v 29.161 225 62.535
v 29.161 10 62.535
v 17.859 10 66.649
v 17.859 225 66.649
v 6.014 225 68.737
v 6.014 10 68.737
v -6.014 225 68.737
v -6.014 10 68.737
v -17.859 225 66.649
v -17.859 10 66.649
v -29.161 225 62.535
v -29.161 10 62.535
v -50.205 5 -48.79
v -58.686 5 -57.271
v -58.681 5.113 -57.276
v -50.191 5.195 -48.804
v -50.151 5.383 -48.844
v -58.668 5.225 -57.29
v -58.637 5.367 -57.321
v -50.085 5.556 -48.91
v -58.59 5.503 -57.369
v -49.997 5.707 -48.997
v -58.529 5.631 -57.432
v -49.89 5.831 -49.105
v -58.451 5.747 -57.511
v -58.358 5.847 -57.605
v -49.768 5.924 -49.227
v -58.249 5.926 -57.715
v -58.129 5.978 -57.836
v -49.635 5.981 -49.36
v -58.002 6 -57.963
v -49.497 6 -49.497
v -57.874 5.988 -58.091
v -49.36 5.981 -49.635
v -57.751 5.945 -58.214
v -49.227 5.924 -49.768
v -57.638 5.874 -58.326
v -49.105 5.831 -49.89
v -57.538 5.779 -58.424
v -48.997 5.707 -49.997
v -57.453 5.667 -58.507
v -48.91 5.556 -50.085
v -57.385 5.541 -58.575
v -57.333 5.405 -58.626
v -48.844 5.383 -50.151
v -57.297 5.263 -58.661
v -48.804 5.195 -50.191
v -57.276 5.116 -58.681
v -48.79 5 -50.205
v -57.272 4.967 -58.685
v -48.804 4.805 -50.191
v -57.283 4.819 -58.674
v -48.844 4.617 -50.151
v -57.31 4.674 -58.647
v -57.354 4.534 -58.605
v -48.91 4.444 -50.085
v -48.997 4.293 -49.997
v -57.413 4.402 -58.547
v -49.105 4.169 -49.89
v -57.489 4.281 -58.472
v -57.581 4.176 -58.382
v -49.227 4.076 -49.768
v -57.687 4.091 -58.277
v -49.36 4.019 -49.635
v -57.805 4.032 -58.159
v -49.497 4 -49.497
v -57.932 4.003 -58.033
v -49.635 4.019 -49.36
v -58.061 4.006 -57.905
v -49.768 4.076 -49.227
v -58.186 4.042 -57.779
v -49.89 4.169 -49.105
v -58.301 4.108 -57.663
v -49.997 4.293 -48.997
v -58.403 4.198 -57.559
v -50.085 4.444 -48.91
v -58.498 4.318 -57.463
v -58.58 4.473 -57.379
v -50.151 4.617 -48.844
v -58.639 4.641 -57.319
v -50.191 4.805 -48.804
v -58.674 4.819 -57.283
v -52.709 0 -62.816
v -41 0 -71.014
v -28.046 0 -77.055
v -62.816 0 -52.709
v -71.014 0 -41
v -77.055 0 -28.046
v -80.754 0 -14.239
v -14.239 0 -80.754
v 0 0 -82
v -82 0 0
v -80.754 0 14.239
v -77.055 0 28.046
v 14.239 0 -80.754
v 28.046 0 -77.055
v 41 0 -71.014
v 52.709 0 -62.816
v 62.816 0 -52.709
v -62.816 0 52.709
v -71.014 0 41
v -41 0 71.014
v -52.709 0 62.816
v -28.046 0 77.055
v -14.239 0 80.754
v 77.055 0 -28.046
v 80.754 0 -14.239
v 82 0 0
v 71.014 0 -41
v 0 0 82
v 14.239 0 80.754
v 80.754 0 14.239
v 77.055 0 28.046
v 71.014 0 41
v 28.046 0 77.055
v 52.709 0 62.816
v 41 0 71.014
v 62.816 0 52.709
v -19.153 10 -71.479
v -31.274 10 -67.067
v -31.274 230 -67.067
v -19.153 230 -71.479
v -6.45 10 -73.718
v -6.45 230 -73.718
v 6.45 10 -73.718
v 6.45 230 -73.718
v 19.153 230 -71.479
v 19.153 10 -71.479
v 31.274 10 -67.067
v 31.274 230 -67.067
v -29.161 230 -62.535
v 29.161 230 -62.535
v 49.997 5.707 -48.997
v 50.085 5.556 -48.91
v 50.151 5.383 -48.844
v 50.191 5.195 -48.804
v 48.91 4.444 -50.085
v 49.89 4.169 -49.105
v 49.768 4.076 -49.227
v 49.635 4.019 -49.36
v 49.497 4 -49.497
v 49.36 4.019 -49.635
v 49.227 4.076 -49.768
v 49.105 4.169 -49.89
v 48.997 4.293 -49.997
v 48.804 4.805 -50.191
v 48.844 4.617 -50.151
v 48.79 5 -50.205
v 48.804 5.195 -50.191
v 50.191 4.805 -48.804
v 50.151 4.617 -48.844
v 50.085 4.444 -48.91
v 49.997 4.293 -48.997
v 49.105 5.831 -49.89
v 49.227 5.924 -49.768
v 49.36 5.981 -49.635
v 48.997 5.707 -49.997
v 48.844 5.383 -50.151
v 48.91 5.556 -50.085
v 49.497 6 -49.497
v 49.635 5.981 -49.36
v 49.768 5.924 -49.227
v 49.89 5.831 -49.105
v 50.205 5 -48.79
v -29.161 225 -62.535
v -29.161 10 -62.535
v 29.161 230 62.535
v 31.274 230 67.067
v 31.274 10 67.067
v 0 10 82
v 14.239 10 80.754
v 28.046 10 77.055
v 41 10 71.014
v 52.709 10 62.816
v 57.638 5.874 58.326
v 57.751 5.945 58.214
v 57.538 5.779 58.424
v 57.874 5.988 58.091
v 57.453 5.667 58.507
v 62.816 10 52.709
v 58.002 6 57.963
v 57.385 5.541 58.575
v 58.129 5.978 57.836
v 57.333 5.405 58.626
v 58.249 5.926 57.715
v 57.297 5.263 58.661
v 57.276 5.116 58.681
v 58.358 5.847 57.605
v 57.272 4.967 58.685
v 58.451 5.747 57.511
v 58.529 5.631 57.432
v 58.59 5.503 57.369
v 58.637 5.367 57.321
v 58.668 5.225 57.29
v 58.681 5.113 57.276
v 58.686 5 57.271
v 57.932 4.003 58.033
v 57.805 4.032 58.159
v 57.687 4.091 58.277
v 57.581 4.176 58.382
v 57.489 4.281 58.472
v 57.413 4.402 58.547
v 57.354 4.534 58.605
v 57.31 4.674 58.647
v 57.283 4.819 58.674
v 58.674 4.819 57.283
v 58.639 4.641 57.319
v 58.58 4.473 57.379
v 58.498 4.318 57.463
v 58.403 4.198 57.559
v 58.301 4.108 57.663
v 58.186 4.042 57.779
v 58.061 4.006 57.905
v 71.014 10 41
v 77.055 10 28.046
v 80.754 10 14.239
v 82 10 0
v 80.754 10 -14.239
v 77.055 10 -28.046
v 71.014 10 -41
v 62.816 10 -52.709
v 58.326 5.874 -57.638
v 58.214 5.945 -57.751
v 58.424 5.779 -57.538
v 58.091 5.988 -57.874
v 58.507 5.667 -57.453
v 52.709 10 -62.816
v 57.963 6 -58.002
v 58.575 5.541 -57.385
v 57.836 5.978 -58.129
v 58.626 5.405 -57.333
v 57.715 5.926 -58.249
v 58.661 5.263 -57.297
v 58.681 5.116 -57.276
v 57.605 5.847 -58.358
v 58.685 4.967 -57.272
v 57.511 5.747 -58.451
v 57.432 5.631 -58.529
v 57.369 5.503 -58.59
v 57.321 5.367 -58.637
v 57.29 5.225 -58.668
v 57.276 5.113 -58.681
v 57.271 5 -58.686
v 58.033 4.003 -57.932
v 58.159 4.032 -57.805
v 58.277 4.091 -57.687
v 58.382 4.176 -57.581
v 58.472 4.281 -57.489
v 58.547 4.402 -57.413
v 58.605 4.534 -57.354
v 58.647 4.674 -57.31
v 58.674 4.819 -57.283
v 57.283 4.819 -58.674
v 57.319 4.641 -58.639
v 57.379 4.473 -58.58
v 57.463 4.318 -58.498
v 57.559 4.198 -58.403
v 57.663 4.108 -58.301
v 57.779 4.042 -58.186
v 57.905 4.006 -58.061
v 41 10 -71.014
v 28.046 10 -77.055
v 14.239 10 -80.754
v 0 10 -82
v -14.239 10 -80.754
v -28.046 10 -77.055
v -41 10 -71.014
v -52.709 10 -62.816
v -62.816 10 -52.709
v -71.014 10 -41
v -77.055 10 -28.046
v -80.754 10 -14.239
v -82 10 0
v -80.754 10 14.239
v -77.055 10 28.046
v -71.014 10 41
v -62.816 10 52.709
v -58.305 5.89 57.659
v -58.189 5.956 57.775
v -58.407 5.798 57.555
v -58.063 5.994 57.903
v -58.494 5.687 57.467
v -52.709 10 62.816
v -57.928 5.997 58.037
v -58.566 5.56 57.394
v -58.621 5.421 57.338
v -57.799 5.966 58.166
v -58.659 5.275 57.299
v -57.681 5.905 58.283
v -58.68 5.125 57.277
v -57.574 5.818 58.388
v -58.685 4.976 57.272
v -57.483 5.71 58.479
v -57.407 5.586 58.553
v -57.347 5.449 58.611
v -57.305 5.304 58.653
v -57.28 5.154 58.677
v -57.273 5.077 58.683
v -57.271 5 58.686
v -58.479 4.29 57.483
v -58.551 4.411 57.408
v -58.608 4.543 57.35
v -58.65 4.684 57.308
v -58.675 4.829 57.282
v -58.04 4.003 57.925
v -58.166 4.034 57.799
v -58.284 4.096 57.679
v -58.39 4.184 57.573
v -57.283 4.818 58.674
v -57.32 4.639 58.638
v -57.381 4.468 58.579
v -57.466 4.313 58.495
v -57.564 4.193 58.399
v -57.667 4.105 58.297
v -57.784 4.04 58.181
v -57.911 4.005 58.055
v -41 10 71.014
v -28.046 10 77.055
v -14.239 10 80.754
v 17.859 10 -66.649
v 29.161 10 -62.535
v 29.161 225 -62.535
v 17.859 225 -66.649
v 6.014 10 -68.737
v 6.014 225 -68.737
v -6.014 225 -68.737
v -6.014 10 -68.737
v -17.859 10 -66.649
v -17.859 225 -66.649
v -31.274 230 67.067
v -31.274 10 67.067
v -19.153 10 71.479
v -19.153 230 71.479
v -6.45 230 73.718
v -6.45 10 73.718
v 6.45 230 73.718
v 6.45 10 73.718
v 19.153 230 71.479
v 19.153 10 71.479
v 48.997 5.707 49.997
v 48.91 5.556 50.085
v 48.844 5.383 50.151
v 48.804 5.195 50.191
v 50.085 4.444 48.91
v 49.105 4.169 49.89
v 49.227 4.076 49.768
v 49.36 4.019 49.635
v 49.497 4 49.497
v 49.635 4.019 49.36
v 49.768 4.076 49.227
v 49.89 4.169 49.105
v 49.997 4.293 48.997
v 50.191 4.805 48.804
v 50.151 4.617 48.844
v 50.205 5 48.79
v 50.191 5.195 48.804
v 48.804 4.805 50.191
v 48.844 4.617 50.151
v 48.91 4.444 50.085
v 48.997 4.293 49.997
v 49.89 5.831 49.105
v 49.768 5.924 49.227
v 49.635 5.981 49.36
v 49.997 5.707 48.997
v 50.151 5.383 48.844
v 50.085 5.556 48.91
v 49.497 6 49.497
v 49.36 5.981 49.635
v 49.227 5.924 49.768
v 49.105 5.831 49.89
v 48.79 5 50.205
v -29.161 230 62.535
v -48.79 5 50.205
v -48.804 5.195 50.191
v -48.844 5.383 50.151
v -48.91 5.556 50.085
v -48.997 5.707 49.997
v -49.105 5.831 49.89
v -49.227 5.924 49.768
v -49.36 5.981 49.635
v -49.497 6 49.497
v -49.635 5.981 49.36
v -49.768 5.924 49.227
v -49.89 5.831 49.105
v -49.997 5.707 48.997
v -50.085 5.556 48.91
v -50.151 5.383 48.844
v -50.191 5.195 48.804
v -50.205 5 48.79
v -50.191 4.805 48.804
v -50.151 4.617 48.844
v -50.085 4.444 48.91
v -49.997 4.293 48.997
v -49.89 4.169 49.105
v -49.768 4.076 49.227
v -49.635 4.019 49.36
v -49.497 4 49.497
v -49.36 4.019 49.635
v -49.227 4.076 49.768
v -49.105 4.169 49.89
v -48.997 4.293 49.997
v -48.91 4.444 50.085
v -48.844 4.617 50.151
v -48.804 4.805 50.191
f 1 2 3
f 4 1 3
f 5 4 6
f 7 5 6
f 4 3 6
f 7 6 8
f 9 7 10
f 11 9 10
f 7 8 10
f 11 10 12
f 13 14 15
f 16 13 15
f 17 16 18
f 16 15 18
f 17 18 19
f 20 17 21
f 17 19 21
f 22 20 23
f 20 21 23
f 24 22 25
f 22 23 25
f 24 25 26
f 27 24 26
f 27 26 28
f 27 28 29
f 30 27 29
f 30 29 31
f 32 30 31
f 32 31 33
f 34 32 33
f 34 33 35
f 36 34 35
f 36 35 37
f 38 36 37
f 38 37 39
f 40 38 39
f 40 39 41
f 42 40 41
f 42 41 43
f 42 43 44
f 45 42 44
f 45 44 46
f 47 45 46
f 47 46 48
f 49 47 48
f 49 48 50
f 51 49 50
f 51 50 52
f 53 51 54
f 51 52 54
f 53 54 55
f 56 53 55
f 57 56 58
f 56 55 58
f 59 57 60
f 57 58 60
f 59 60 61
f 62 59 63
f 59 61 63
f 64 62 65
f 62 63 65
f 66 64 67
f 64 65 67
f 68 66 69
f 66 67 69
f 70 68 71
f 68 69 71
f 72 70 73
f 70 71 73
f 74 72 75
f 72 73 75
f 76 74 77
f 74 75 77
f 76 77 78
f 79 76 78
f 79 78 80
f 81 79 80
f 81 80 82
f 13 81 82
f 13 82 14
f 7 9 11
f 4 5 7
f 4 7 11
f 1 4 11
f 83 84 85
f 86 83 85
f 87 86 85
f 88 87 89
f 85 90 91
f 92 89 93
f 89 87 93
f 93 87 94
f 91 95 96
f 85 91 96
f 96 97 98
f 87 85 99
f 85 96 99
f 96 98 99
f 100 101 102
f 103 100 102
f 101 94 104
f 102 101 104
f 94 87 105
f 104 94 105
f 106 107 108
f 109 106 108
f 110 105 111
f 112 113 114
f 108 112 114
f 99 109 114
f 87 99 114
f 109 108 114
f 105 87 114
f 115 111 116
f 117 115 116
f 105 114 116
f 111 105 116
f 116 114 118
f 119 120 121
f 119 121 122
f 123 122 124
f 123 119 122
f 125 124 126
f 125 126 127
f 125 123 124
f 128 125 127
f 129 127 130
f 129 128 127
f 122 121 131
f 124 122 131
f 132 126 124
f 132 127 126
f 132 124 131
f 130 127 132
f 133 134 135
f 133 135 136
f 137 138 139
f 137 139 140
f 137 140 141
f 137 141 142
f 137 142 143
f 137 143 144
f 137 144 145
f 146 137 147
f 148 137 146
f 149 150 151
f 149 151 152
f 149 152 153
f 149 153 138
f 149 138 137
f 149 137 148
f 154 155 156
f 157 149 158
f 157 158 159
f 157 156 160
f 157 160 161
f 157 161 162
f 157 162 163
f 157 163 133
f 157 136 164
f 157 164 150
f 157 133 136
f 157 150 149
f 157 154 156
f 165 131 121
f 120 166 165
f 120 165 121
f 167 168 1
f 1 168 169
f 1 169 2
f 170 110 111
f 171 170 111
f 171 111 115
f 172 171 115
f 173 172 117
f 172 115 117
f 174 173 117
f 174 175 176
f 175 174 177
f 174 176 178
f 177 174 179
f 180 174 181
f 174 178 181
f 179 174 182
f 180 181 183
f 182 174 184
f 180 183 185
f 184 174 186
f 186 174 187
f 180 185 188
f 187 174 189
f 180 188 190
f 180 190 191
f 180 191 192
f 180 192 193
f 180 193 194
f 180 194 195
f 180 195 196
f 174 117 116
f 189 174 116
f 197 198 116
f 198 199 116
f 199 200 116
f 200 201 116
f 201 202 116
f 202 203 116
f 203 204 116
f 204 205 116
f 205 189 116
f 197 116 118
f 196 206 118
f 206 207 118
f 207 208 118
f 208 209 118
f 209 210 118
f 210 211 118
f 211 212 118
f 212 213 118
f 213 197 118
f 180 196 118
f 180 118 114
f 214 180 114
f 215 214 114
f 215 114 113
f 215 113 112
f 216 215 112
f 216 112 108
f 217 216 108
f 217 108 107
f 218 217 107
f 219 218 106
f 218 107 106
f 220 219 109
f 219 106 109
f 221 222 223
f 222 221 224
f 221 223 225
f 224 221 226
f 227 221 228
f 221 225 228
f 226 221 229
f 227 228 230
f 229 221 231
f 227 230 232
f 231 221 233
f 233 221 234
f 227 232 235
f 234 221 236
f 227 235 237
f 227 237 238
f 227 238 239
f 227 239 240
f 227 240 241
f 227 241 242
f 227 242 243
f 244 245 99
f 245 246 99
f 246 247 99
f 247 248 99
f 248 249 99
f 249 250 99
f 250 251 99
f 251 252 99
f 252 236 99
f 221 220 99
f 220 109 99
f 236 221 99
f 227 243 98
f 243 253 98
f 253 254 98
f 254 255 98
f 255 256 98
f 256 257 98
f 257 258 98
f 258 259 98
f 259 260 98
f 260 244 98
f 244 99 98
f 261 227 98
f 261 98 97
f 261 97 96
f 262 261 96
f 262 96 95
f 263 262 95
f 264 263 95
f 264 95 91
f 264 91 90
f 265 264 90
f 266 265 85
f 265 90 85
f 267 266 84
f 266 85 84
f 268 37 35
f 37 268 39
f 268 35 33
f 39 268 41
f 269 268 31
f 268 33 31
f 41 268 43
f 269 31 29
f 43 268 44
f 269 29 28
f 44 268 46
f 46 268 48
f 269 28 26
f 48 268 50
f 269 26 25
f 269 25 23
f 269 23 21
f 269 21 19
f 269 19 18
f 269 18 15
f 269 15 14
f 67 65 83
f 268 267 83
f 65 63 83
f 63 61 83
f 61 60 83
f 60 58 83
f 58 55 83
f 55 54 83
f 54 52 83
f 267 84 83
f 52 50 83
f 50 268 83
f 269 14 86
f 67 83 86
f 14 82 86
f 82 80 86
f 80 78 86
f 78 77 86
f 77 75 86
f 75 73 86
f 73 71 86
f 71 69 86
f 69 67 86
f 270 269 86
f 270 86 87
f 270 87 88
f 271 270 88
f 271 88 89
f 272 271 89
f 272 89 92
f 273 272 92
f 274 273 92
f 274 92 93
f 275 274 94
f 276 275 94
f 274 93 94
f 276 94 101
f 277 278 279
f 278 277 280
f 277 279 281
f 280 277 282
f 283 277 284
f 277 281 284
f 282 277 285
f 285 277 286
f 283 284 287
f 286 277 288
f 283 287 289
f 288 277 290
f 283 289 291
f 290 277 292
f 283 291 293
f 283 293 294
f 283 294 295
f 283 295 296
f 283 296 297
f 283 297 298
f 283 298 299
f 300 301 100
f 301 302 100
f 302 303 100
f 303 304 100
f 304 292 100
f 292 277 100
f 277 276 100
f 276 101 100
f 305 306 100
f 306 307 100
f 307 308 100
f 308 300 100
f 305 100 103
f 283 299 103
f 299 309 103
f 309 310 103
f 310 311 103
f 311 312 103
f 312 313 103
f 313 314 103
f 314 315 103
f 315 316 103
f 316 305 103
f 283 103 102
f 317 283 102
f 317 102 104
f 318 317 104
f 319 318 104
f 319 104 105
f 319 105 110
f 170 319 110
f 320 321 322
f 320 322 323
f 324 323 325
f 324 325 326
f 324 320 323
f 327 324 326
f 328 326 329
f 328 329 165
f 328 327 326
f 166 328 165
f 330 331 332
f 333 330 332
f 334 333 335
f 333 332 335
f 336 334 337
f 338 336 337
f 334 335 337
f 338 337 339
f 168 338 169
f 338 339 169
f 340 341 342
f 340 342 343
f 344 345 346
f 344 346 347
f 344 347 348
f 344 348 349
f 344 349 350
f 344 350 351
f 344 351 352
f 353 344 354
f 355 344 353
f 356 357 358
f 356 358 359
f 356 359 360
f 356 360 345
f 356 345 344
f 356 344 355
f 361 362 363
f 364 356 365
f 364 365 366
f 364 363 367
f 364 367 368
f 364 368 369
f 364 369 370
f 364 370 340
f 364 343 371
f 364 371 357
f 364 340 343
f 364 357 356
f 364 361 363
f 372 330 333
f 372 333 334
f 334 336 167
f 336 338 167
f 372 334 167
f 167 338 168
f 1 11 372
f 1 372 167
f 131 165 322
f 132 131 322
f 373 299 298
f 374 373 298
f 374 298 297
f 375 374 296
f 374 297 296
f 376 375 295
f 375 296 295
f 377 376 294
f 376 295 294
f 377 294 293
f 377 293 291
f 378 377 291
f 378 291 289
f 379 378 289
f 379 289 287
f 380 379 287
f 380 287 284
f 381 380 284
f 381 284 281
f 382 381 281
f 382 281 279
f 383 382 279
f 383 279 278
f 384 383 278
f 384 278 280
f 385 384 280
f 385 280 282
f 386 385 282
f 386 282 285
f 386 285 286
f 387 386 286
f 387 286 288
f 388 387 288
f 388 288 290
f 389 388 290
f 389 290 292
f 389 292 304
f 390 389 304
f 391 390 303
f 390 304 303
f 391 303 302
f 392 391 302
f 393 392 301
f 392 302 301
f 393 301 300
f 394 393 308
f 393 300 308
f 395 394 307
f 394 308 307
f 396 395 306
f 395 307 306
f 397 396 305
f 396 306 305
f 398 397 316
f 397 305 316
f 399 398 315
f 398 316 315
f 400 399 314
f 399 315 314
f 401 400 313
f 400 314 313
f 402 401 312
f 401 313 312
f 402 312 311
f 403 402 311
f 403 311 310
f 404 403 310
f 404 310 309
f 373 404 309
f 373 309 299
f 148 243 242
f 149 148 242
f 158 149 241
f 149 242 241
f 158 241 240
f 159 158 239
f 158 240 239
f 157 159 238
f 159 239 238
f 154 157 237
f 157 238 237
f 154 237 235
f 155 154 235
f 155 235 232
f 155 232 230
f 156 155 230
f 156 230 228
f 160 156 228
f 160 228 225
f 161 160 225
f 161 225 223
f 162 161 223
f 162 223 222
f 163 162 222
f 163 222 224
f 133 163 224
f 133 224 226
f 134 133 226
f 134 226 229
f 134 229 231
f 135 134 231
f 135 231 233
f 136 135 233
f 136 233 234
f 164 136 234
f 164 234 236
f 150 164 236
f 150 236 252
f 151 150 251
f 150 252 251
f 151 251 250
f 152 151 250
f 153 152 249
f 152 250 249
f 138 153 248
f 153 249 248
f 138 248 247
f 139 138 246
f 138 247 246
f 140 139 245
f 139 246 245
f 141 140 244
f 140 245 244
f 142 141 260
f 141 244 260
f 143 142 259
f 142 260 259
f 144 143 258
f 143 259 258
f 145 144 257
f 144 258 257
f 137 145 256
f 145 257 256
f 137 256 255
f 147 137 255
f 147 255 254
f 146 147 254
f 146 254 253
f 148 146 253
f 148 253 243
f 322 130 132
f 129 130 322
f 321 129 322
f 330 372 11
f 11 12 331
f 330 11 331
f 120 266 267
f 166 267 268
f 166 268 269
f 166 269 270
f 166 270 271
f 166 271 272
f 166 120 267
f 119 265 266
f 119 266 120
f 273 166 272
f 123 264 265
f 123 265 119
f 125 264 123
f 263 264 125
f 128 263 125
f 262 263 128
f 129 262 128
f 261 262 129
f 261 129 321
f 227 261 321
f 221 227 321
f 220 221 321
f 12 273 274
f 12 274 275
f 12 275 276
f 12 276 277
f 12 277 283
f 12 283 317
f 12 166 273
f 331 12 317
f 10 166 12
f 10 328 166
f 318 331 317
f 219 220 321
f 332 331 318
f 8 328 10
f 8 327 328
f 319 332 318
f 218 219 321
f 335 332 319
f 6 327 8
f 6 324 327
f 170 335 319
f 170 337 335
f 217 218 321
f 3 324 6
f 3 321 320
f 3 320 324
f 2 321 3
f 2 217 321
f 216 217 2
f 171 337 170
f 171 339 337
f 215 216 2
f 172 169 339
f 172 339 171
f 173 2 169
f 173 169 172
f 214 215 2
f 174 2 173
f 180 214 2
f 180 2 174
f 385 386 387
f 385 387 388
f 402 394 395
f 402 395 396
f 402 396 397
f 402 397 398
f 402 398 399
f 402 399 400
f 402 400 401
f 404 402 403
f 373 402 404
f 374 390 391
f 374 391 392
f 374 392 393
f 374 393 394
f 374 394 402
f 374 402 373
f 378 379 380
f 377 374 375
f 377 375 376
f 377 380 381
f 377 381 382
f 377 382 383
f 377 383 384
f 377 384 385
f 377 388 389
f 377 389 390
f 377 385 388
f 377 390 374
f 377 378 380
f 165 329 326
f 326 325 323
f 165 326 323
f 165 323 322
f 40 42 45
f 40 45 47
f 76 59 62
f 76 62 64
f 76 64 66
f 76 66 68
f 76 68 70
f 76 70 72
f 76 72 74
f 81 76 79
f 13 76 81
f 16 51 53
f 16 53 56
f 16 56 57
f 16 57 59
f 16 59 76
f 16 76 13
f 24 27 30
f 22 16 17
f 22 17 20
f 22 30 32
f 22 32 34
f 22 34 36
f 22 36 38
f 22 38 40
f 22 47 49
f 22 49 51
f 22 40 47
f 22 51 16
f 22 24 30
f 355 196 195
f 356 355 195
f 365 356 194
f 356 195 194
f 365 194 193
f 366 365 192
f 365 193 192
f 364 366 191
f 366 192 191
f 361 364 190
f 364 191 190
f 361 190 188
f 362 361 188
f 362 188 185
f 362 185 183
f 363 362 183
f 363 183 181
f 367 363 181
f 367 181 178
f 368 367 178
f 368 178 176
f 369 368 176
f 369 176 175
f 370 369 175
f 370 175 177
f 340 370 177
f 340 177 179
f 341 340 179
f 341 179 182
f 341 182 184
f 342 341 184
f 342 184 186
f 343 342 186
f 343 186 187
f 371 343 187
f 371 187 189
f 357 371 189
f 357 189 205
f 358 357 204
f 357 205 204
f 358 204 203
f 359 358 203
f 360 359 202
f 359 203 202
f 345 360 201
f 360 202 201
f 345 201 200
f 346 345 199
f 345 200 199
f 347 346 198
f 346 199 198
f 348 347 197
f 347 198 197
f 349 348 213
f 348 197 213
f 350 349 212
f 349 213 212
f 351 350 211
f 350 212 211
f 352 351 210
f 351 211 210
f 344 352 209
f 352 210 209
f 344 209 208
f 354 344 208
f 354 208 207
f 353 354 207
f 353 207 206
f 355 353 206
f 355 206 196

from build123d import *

# Parameters (mm, degrees)
SKETCH1_R           = 82
BOSS_EXTRUDE1_DEPTH = 10
BOSS_EXTRUDE4_DEPTH = 220
BOSS_EXTRUDE5_START = -5
BOSS_EXTRUDE5_DEPTH = 5
SKETCH7_R           = 1
CUT_EXTRUDE1_DEPTH  = 12
CIRPATTERN1_COUNT   = 4


with BuildPart() as part:
    # Sketch1 → Boss-Extrude1 (new body)
    with BuildSketch(Plane(origin=(0, 0, 0), x_dir=(1, 0, 0), z_dir=(0, 1, 0))):
        with Locations(Location((0, 0, 0), (0, 0, 270))):
            Circle(SKETCH1_R)
    extrude(amount=BOSS_EXTRUDE1_DEPTH)

    # Sketch2 → Boss-Extrude4 (add)
    with BuildSketch(Plane(origin=(0, 10, 0), x_dir=(1, 0, 0), z_dir=(0, 1, 0))):
        with BuildLine():
            Line((-29.16066006, 62.535237306), (-31.273751369, 67.066776241))
            ThreePointArc((-31.273751369, 67.066776241), (0, 74), (31.273751369, 67.066776241))
            Line((31.273751369, 67.066776241), (29.16066006, 62.535237306))
            ThreePointArc((29.16066006, 62.535237306), (0, 69), (-29.16066006, 62.535237306))
        make_face()
    boss_extrude4 = extrude(amount=BOSS_EXTRUDE4_DEPTH)

    # Mirror2: Boss-Extrude4 across plane
    add(boss_extrude4.mirror(Plane.XY))

    # Sketch4 → Boss-Extrude5 (add)
    with BuildSketch(Plane(origin=(0, 230, 0), x_dir=(1, 0, 0), z_dir=(0, 1, 0)).offset(BOSS_EXTRUDE5_START)):
        with BuildLine():
            Line((-29.16066006, 62.535237306), (29.16066006, 62.535237306))
            ThreePointArc((29.16066006, 62.535237306), (0, 69), (-29.16066006, 62.535237306))
        make_face()
    boss_extrude5 = extrude(amount=BOSS_EXTRUDE5_DEPTH)

    # Mirror3: Boss-Extrude5 across plane
    add(boss_extrude5.mirror(Plane.XY))

    # Sketch7 → Cut-Extrude1 (cut)
    with BuildSketch(Plane(origin=(-57.982756057, 0, 57.982756057), x_dir=(0.7071067811865477, 0, 0.7071067811865475), z_dir=(-0.7071067811865475, 0, 0.7071067811865477))):
        with Locations((0, 5)):
            Circle(SKETCH7_R)
    cut_extrude1 = extrude(amount=-CUT_EXTRUDE1_DEPTH, mode=Mode.SUBTRACT)

    # CirPattern1: Cut-Extrude1 ×4 about axis
    cirpattern1_axis = Axis((0, 0, 0), (0, 1, 0))
    for i in range(1, CIRPATTERN1_COUNT):
        add(cut_extrude1.rotate(cirpattern1_axis, i * 360 / CIRPATTERN1_COUNT), mode=Mode.SUBTRACT)


solid = part.part
